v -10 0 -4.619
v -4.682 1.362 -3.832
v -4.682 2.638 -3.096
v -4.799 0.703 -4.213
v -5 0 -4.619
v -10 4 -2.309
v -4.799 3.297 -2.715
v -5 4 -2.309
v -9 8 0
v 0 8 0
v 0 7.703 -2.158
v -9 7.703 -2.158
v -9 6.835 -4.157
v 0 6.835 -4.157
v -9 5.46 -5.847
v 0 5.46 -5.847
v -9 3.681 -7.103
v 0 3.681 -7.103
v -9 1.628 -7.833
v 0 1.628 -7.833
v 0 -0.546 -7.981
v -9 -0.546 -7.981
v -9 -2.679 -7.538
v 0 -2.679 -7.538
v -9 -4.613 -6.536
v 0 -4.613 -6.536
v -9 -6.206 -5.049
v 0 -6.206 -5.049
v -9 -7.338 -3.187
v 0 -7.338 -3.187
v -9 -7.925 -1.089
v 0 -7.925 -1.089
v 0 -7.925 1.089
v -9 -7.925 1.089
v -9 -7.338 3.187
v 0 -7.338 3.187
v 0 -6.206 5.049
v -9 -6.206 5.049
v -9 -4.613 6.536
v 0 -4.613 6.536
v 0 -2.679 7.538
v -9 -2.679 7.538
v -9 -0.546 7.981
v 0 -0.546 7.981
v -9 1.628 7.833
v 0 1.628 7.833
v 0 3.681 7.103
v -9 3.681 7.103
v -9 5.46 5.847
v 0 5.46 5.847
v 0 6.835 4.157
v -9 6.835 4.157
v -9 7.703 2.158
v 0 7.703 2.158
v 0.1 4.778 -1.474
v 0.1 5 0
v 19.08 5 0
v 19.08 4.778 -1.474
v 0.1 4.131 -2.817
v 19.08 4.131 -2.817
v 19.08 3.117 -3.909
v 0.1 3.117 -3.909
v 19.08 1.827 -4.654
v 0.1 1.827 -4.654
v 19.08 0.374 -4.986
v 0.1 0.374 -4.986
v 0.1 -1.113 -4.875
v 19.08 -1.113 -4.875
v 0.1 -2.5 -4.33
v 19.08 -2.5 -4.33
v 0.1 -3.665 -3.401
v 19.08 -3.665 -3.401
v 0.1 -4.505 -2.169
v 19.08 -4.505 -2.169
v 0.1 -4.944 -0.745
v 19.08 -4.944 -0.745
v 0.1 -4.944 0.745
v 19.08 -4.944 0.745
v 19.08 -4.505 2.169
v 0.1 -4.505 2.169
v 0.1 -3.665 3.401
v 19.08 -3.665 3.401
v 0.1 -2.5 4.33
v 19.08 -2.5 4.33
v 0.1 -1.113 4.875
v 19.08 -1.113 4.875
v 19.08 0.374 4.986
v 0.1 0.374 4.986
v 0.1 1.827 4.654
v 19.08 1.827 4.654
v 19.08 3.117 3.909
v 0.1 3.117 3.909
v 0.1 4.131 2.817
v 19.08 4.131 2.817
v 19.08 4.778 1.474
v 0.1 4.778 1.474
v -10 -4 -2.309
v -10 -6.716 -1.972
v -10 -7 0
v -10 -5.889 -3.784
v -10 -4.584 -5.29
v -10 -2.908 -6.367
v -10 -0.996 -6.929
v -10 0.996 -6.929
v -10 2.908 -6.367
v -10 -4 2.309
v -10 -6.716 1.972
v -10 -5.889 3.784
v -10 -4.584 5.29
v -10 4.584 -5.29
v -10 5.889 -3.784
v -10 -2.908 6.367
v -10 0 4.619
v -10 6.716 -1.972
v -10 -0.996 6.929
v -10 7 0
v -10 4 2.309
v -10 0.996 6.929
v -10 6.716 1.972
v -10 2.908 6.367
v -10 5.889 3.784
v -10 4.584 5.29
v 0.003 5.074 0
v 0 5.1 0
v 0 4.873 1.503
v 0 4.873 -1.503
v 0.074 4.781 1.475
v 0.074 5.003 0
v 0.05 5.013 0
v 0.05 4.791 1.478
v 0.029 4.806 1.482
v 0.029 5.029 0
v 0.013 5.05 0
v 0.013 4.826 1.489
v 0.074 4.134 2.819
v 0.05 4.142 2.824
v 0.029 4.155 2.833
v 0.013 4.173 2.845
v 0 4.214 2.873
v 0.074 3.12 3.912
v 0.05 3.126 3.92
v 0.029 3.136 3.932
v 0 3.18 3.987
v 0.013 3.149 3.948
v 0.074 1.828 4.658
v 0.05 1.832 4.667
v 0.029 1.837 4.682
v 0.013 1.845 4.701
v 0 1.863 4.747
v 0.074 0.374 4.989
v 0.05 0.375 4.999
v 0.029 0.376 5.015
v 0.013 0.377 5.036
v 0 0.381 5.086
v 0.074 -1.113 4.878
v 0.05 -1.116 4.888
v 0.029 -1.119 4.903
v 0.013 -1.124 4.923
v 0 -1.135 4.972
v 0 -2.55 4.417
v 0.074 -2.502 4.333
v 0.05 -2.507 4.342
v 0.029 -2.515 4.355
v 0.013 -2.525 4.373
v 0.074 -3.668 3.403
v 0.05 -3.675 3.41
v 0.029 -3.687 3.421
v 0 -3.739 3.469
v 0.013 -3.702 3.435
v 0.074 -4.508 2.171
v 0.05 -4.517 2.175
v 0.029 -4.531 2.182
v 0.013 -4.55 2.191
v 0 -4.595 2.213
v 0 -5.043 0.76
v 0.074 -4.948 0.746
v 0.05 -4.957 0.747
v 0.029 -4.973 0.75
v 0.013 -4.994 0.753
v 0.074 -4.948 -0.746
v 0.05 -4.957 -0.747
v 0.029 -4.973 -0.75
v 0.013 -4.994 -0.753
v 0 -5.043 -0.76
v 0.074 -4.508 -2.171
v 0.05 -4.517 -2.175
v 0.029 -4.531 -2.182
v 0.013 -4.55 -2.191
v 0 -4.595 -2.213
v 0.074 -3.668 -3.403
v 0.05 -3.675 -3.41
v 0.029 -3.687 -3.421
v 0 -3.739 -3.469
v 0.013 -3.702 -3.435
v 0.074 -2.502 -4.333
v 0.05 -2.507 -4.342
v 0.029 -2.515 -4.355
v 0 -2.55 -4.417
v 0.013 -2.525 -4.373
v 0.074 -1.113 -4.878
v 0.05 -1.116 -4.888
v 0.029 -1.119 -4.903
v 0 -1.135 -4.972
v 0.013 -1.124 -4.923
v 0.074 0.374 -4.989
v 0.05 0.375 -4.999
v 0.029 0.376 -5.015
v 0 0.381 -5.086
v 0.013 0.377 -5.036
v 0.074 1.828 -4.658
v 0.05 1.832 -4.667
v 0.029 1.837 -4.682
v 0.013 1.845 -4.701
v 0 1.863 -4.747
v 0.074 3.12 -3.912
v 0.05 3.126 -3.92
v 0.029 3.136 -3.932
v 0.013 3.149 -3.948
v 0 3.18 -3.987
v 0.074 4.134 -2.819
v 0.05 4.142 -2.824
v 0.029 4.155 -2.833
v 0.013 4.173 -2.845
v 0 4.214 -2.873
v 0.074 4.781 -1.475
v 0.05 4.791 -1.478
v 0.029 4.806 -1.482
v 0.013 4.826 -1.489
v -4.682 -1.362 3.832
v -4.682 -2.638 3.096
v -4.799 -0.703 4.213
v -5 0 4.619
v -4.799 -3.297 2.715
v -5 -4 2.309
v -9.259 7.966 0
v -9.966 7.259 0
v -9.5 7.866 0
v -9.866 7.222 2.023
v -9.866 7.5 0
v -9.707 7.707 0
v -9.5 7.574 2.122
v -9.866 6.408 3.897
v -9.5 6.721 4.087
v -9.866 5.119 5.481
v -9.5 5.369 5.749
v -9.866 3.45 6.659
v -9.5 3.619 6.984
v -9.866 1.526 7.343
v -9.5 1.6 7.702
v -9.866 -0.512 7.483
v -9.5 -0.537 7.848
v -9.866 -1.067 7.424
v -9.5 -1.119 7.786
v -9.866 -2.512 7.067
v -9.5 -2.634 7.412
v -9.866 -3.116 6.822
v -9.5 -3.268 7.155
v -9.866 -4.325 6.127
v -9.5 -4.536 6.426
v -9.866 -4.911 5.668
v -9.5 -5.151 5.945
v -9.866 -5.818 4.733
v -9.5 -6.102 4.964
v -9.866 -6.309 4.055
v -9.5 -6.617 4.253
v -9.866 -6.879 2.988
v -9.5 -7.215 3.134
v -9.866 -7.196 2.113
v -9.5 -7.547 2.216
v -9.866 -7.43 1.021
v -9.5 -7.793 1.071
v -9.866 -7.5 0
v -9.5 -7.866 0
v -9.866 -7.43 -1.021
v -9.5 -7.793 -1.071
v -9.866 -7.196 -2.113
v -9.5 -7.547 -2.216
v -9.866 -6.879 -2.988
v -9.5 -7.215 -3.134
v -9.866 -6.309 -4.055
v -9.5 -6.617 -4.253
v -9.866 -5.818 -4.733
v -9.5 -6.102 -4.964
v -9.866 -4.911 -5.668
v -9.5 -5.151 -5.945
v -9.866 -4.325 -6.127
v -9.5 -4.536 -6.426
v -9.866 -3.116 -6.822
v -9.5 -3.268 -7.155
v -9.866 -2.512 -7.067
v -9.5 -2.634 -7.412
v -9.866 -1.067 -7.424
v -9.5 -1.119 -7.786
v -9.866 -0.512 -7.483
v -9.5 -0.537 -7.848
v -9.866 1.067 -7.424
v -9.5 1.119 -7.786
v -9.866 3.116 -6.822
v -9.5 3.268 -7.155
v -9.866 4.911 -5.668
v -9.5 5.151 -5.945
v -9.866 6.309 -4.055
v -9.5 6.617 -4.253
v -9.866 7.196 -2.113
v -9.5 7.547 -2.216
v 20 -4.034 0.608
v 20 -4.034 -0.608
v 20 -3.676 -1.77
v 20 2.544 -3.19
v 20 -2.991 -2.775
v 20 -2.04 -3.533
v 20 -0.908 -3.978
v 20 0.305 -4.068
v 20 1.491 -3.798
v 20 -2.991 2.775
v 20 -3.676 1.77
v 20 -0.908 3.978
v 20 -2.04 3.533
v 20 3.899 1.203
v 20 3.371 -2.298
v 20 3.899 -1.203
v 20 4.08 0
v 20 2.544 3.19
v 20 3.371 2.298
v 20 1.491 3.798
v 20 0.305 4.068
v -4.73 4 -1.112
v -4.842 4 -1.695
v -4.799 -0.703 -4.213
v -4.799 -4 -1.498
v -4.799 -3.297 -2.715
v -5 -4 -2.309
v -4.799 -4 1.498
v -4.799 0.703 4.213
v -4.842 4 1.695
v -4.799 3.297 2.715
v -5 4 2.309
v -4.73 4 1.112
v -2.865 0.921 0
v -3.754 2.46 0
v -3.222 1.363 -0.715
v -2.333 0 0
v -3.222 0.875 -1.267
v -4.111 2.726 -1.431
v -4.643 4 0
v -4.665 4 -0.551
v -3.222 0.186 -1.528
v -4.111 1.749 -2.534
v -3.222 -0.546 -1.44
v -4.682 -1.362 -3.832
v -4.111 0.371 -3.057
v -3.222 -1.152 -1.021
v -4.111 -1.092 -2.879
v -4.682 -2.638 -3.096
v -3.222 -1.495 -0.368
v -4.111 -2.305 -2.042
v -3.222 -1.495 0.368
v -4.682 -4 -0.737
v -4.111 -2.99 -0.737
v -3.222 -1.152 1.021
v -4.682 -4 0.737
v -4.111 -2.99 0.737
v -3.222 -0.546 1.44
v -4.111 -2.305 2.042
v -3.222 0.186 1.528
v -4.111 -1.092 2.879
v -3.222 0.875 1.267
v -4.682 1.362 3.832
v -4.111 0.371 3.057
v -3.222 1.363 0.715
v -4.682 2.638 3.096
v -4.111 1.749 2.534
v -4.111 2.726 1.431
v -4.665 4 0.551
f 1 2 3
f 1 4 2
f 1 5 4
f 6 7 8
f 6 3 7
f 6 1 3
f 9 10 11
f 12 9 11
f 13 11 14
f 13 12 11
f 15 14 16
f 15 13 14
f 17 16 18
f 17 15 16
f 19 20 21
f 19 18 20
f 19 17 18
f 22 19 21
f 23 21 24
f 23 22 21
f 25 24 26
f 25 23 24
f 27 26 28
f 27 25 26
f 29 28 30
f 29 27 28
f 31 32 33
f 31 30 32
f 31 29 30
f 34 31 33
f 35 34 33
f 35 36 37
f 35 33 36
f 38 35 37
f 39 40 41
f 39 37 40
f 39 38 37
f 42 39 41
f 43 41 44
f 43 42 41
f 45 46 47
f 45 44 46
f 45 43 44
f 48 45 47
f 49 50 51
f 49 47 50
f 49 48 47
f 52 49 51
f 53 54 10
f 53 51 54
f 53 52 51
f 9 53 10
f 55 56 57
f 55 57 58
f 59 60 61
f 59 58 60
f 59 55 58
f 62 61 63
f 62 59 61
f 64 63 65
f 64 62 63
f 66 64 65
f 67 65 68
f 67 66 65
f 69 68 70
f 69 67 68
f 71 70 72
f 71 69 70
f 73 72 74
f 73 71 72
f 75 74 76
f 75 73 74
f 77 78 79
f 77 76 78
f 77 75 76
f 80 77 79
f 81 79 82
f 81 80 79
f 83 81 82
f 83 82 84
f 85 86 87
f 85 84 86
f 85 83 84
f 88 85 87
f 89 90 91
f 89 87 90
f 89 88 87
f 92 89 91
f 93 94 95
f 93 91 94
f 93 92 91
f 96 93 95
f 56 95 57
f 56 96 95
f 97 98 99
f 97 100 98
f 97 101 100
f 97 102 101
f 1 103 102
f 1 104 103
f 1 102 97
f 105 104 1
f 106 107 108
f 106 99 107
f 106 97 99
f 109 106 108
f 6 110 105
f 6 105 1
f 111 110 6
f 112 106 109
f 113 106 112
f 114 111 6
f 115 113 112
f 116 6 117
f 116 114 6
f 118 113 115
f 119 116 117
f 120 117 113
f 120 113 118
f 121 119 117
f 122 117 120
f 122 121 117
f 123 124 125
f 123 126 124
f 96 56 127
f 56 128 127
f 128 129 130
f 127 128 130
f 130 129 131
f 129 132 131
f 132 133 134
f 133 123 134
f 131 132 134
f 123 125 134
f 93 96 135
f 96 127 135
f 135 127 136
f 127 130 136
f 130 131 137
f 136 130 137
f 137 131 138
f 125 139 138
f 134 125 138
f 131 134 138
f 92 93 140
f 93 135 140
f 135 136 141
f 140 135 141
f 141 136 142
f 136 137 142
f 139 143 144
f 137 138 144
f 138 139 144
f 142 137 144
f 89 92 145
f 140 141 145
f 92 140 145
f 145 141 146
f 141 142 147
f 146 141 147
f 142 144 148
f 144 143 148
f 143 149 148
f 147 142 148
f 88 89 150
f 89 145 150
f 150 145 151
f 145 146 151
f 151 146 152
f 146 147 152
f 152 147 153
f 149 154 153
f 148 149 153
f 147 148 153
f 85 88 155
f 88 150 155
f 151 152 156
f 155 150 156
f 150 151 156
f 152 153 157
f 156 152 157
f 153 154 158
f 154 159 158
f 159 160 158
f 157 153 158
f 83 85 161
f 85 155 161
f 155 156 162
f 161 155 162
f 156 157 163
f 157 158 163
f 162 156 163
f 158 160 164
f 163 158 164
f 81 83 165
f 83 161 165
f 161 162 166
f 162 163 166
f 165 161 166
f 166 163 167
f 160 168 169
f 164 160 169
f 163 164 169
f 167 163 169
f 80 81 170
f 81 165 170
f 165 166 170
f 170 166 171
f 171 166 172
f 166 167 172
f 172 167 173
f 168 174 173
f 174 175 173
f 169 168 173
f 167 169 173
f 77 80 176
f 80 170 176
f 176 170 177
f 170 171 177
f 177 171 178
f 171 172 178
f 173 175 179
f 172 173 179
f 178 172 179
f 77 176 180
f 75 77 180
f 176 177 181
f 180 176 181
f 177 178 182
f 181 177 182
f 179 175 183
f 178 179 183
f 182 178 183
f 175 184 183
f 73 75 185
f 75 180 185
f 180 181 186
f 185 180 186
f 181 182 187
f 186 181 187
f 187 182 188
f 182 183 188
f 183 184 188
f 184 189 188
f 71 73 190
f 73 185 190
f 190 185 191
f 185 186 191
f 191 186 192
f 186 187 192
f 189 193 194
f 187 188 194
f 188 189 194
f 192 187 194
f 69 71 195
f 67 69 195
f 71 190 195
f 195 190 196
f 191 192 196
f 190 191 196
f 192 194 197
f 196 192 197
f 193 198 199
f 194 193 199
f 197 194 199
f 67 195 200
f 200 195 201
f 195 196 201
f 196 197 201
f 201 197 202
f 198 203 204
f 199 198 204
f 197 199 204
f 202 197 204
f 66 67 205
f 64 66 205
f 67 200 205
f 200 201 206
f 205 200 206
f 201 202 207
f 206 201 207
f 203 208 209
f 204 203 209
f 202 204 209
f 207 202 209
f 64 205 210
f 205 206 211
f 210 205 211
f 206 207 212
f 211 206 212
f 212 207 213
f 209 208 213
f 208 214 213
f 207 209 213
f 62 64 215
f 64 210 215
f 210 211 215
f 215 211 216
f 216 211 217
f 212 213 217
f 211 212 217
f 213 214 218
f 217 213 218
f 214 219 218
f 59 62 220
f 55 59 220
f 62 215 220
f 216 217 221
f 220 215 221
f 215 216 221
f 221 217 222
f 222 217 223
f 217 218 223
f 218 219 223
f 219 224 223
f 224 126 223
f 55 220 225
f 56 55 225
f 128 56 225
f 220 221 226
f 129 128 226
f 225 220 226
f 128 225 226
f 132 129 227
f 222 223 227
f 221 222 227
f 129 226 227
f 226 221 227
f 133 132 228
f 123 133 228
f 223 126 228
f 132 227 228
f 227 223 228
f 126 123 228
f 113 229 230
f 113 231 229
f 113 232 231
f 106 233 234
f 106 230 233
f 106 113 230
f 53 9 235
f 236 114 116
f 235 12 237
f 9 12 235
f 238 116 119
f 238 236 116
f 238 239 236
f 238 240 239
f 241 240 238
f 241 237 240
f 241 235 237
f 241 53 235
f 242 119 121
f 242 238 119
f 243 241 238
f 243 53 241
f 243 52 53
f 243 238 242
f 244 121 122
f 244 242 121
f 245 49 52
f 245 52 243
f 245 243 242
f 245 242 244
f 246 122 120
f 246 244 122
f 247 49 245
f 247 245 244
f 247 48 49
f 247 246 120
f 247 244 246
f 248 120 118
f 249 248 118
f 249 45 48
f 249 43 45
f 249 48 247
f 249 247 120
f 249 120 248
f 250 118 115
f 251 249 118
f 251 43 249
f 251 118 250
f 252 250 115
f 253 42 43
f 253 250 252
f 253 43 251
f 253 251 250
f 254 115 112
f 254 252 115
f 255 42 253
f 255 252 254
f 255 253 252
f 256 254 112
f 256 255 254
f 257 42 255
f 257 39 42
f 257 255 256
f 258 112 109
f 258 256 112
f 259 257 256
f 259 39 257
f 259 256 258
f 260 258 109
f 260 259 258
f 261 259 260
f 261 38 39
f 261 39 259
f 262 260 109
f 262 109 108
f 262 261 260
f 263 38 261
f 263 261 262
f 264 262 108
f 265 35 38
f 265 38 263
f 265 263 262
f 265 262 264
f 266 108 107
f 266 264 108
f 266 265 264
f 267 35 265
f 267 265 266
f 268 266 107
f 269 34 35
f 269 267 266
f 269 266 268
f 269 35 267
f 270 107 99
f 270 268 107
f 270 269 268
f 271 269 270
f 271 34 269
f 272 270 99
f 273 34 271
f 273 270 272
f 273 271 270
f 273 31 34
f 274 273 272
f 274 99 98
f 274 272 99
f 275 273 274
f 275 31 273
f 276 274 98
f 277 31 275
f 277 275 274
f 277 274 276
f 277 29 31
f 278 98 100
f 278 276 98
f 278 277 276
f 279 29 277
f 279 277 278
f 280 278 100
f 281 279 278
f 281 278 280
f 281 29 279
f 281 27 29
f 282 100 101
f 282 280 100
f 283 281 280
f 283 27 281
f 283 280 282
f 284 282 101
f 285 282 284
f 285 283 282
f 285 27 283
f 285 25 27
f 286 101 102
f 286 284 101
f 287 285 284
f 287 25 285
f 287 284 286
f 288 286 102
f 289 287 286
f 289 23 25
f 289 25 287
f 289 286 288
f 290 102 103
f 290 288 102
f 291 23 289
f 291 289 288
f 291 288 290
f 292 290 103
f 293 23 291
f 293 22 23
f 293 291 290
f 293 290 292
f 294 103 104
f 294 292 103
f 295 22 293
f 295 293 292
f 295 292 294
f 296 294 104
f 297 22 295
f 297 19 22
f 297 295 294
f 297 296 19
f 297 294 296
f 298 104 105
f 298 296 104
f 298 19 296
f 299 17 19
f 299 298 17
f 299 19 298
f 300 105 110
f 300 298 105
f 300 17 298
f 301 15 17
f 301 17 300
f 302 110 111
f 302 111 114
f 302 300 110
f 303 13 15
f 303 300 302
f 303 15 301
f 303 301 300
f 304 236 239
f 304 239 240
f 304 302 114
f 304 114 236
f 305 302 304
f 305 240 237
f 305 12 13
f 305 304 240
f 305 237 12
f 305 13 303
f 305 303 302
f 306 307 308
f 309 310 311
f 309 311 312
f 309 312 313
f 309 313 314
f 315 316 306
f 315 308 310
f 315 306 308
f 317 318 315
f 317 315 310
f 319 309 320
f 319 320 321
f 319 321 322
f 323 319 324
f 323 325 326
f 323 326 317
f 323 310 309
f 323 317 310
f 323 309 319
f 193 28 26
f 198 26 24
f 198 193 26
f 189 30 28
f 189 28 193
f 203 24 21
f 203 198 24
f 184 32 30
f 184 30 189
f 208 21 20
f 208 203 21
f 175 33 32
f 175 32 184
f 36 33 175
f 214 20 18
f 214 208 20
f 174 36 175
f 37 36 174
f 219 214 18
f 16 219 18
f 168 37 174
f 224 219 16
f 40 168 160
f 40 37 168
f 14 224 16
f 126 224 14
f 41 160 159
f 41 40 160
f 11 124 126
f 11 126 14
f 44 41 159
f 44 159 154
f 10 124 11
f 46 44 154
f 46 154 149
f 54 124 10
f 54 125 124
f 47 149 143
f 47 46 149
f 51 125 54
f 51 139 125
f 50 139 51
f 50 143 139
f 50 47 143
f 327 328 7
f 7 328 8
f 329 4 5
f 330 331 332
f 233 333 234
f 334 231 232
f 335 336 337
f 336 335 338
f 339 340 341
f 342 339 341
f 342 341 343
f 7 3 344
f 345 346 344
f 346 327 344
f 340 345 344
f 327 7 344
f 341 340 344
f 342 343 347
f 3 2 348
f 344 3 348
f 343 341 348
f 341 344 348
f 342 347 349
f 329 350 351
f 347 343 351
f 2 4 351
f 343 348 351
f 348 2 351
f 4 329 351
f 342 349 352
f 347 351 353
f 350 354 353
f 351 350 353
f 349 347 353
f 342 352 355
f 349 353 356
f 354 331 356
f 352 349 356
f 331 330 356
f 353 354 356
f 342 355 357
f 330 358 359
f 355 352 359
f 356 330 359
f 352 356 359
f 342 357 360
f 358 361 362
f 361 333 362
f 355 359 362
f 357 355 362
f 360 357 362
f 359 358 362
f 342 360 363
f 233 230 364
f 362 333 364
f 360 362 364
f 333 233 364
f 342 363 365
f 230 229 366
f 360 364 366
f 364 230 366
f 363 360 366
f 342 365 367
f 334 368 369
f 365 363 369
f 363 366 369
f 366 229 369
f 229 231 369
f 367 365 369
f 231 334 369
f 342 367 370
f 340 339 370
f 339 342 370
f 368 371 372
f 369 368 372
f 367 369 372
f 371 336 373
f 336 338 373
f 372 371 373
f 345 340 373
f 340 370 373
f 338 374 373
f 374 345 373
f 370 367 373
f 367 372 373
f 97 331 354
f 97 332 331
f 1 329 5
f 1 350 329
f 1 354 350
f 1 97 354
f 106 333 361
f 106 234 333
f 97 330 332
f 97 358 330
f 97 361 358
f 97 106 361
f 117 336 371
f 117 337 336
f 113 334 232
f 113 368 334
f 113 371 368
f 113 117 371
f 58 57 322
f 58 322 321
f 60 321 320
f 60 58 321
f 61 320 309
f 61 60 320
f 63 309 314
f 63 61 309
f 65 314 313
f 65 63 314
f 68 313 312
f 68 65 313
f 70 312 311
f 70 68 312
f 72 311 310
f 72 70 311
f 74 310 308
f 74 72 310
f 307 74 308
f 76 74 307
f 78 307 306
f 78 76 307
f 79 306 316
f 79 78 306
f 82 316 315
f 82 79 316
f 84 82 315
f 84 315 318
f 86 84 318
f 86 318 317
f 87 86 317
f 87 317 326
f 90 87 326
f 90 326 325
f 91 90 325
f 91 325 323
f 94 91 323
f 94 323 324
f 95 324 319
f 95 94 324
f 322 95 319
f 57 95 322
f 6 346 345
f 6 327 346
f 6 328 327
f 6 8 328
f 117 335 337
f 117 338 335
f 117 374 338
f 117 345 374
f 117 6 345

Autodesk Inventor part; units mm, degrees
ref_plane "YZ Plane" through (0, 0, 0) normal (1, 0, 0) x (0, 1, 0)
ref_plane "XZ Plane" through (0, 0, 0) normal (0, 1, 0) x (-1, 0, 0)
sketch "Skizze1" plane through (0, 0, 0) normal (0, 0, 1) x (1, 0, 0)
  line L0 (-2.3333, 0) -> (20, 0)
  line L1 (20, 0) -> (20, 5)
  line L2 (20, 5) -> (3.75, 5)
  line L3 (3.75, 5) -> (2.8297, 5)
  line L4 (2.8297, 5) -> (0, 5)
  line L5 (0, 5) -> (0, 8)
  line L6 (0, 8) -> (-10, 8)
  line L7 (-10, 8) -> (-10, 4.6188)
  line L8 (-10, 4.6188) -> (-5, 4.6188)
  line L9 (-5, 4.6188) -> (-2.3333, 0)
  line L10 (-16, 0) -> (26, 0) projected
  line L11 (0, -1.6) -> (0, 9.6) projected
  line L12 (3.75, 5) -> (0, 5) construction
  dimension "d1" = 16.25
  dimension "d2" = 0.9203
  dimension "d3" = 10
  dimension "d4" = 5
  dimension "d5" = 60
  dimension "d6" = 10
  dimension "d7" = 10
  dimension "d8" = 9.2376
  dimension "d9" = 16
  dimension "d26" = 20
revolve "Körper" add sketch "Skizze1" angle 360 about axis through (-2.3333, 0, 0) along (1, 0, 0)
sketch "Skizze2" plane through (-10, 0, 0) normal (-1, 0, 0) x (0, 0, 1)
  circle A0 centre (0, 0) radius 4.6188 projected
  line L0 (0, -11.2) -> (0, 11.2) projected
  line L1 (-11.2, 0) -> (11.2, 0) projected
  line L2 (4.6188, 0) -> (2.3094, -4)
  line L3 (2.3094, -4) -> (-2.3094, -4)
  line L4 (-2.3094, -4) -> (-4.6188, 0)
  line L5 (-4.6188, 0) -> (-2.3094, 4)
  line L6 (-2.3094, 4) -> (2.3094, 4)
  line L7 (2.3094, 4) -> (4.6188, 0)
  point P0 (0, 0)
extrude "Loch" add sketch "Skizze2" against normal up to next contours L7 A0 | A0 L2 | L6 L0 A0 | A0 L0 L3 | L0 L6 A0 | A0 L3 L0 | L4 A0 | A0 L5
fillet "Rundung1" radius 1 1 edges at (-10, -8, 0)
thread "Gewinde" size "M10x1.5" class "6g" standard "ISO Metric profile" length 16.25
chamfer "Fase1" distance 0.9202 distance2 0.9202 1 edges at (20, -5, 0) measured on face at (20, -0.8193, -0.3214)
ref_plane "Work Plane1" through (29, 0, 0) normal (0, -1, 0) x (1, 0, 0)
fillet "Fillet2" radius 0.1 1 edges at (0, -5, 0)
equation "\"d30\" = R"
equation "\"d17\" = RR"
equation "\"d13\" = GEL"
equation "\"d15\" = -0.5 * SPD + 0.5 * GD"
equation "\"d16\" = GUL"
equation "\"d1\" = GEL"
equation "\"d3\" = KOH"
equation "\"d4\" = INTI"
equation "\"d6\" = GD"
equation "\"d7\" = BDM"
equation "\"d8\" = 1.1547 * SW"
equation "\"d9\" = KOD"
equation "\"d26\" = NLG"
equation "\"GD\" = 10"
equation "\"NLG\" = 20"
equation "\"GEL\" = 16.25"
equation "\"KOD\" = 16"
equation "\"KOH\" = 10"
equation "\"INTI\" = 5"
equation "\"GAL\" = 0.61345 * PTC"
equation "\"GUL\" = 0.61345 * PTC"
equation "\"BDM\" = NND"
equation "\"SW\" = 8"
equation "\"RR\" = 1"
equation "\"SPD\" = NND - 1.2269 * PTC"
equation "\"R\" = 0.1"
equation "\"TOA\" = 30deg"
equation "\"GD1\" = THREADDIA - 1.2269 * PTC"
equation "\"FAWI\" = 45deg"
equation "\"PTC\" = 1.5"
equation "\"E0\" = 1.155 * SW"
equation "\"NND\" = 10"
equation "\"THREADDIA\" = 10"
properties part number "ISO 4762 - M10 x 20" material "Edelstahl, 440C"
